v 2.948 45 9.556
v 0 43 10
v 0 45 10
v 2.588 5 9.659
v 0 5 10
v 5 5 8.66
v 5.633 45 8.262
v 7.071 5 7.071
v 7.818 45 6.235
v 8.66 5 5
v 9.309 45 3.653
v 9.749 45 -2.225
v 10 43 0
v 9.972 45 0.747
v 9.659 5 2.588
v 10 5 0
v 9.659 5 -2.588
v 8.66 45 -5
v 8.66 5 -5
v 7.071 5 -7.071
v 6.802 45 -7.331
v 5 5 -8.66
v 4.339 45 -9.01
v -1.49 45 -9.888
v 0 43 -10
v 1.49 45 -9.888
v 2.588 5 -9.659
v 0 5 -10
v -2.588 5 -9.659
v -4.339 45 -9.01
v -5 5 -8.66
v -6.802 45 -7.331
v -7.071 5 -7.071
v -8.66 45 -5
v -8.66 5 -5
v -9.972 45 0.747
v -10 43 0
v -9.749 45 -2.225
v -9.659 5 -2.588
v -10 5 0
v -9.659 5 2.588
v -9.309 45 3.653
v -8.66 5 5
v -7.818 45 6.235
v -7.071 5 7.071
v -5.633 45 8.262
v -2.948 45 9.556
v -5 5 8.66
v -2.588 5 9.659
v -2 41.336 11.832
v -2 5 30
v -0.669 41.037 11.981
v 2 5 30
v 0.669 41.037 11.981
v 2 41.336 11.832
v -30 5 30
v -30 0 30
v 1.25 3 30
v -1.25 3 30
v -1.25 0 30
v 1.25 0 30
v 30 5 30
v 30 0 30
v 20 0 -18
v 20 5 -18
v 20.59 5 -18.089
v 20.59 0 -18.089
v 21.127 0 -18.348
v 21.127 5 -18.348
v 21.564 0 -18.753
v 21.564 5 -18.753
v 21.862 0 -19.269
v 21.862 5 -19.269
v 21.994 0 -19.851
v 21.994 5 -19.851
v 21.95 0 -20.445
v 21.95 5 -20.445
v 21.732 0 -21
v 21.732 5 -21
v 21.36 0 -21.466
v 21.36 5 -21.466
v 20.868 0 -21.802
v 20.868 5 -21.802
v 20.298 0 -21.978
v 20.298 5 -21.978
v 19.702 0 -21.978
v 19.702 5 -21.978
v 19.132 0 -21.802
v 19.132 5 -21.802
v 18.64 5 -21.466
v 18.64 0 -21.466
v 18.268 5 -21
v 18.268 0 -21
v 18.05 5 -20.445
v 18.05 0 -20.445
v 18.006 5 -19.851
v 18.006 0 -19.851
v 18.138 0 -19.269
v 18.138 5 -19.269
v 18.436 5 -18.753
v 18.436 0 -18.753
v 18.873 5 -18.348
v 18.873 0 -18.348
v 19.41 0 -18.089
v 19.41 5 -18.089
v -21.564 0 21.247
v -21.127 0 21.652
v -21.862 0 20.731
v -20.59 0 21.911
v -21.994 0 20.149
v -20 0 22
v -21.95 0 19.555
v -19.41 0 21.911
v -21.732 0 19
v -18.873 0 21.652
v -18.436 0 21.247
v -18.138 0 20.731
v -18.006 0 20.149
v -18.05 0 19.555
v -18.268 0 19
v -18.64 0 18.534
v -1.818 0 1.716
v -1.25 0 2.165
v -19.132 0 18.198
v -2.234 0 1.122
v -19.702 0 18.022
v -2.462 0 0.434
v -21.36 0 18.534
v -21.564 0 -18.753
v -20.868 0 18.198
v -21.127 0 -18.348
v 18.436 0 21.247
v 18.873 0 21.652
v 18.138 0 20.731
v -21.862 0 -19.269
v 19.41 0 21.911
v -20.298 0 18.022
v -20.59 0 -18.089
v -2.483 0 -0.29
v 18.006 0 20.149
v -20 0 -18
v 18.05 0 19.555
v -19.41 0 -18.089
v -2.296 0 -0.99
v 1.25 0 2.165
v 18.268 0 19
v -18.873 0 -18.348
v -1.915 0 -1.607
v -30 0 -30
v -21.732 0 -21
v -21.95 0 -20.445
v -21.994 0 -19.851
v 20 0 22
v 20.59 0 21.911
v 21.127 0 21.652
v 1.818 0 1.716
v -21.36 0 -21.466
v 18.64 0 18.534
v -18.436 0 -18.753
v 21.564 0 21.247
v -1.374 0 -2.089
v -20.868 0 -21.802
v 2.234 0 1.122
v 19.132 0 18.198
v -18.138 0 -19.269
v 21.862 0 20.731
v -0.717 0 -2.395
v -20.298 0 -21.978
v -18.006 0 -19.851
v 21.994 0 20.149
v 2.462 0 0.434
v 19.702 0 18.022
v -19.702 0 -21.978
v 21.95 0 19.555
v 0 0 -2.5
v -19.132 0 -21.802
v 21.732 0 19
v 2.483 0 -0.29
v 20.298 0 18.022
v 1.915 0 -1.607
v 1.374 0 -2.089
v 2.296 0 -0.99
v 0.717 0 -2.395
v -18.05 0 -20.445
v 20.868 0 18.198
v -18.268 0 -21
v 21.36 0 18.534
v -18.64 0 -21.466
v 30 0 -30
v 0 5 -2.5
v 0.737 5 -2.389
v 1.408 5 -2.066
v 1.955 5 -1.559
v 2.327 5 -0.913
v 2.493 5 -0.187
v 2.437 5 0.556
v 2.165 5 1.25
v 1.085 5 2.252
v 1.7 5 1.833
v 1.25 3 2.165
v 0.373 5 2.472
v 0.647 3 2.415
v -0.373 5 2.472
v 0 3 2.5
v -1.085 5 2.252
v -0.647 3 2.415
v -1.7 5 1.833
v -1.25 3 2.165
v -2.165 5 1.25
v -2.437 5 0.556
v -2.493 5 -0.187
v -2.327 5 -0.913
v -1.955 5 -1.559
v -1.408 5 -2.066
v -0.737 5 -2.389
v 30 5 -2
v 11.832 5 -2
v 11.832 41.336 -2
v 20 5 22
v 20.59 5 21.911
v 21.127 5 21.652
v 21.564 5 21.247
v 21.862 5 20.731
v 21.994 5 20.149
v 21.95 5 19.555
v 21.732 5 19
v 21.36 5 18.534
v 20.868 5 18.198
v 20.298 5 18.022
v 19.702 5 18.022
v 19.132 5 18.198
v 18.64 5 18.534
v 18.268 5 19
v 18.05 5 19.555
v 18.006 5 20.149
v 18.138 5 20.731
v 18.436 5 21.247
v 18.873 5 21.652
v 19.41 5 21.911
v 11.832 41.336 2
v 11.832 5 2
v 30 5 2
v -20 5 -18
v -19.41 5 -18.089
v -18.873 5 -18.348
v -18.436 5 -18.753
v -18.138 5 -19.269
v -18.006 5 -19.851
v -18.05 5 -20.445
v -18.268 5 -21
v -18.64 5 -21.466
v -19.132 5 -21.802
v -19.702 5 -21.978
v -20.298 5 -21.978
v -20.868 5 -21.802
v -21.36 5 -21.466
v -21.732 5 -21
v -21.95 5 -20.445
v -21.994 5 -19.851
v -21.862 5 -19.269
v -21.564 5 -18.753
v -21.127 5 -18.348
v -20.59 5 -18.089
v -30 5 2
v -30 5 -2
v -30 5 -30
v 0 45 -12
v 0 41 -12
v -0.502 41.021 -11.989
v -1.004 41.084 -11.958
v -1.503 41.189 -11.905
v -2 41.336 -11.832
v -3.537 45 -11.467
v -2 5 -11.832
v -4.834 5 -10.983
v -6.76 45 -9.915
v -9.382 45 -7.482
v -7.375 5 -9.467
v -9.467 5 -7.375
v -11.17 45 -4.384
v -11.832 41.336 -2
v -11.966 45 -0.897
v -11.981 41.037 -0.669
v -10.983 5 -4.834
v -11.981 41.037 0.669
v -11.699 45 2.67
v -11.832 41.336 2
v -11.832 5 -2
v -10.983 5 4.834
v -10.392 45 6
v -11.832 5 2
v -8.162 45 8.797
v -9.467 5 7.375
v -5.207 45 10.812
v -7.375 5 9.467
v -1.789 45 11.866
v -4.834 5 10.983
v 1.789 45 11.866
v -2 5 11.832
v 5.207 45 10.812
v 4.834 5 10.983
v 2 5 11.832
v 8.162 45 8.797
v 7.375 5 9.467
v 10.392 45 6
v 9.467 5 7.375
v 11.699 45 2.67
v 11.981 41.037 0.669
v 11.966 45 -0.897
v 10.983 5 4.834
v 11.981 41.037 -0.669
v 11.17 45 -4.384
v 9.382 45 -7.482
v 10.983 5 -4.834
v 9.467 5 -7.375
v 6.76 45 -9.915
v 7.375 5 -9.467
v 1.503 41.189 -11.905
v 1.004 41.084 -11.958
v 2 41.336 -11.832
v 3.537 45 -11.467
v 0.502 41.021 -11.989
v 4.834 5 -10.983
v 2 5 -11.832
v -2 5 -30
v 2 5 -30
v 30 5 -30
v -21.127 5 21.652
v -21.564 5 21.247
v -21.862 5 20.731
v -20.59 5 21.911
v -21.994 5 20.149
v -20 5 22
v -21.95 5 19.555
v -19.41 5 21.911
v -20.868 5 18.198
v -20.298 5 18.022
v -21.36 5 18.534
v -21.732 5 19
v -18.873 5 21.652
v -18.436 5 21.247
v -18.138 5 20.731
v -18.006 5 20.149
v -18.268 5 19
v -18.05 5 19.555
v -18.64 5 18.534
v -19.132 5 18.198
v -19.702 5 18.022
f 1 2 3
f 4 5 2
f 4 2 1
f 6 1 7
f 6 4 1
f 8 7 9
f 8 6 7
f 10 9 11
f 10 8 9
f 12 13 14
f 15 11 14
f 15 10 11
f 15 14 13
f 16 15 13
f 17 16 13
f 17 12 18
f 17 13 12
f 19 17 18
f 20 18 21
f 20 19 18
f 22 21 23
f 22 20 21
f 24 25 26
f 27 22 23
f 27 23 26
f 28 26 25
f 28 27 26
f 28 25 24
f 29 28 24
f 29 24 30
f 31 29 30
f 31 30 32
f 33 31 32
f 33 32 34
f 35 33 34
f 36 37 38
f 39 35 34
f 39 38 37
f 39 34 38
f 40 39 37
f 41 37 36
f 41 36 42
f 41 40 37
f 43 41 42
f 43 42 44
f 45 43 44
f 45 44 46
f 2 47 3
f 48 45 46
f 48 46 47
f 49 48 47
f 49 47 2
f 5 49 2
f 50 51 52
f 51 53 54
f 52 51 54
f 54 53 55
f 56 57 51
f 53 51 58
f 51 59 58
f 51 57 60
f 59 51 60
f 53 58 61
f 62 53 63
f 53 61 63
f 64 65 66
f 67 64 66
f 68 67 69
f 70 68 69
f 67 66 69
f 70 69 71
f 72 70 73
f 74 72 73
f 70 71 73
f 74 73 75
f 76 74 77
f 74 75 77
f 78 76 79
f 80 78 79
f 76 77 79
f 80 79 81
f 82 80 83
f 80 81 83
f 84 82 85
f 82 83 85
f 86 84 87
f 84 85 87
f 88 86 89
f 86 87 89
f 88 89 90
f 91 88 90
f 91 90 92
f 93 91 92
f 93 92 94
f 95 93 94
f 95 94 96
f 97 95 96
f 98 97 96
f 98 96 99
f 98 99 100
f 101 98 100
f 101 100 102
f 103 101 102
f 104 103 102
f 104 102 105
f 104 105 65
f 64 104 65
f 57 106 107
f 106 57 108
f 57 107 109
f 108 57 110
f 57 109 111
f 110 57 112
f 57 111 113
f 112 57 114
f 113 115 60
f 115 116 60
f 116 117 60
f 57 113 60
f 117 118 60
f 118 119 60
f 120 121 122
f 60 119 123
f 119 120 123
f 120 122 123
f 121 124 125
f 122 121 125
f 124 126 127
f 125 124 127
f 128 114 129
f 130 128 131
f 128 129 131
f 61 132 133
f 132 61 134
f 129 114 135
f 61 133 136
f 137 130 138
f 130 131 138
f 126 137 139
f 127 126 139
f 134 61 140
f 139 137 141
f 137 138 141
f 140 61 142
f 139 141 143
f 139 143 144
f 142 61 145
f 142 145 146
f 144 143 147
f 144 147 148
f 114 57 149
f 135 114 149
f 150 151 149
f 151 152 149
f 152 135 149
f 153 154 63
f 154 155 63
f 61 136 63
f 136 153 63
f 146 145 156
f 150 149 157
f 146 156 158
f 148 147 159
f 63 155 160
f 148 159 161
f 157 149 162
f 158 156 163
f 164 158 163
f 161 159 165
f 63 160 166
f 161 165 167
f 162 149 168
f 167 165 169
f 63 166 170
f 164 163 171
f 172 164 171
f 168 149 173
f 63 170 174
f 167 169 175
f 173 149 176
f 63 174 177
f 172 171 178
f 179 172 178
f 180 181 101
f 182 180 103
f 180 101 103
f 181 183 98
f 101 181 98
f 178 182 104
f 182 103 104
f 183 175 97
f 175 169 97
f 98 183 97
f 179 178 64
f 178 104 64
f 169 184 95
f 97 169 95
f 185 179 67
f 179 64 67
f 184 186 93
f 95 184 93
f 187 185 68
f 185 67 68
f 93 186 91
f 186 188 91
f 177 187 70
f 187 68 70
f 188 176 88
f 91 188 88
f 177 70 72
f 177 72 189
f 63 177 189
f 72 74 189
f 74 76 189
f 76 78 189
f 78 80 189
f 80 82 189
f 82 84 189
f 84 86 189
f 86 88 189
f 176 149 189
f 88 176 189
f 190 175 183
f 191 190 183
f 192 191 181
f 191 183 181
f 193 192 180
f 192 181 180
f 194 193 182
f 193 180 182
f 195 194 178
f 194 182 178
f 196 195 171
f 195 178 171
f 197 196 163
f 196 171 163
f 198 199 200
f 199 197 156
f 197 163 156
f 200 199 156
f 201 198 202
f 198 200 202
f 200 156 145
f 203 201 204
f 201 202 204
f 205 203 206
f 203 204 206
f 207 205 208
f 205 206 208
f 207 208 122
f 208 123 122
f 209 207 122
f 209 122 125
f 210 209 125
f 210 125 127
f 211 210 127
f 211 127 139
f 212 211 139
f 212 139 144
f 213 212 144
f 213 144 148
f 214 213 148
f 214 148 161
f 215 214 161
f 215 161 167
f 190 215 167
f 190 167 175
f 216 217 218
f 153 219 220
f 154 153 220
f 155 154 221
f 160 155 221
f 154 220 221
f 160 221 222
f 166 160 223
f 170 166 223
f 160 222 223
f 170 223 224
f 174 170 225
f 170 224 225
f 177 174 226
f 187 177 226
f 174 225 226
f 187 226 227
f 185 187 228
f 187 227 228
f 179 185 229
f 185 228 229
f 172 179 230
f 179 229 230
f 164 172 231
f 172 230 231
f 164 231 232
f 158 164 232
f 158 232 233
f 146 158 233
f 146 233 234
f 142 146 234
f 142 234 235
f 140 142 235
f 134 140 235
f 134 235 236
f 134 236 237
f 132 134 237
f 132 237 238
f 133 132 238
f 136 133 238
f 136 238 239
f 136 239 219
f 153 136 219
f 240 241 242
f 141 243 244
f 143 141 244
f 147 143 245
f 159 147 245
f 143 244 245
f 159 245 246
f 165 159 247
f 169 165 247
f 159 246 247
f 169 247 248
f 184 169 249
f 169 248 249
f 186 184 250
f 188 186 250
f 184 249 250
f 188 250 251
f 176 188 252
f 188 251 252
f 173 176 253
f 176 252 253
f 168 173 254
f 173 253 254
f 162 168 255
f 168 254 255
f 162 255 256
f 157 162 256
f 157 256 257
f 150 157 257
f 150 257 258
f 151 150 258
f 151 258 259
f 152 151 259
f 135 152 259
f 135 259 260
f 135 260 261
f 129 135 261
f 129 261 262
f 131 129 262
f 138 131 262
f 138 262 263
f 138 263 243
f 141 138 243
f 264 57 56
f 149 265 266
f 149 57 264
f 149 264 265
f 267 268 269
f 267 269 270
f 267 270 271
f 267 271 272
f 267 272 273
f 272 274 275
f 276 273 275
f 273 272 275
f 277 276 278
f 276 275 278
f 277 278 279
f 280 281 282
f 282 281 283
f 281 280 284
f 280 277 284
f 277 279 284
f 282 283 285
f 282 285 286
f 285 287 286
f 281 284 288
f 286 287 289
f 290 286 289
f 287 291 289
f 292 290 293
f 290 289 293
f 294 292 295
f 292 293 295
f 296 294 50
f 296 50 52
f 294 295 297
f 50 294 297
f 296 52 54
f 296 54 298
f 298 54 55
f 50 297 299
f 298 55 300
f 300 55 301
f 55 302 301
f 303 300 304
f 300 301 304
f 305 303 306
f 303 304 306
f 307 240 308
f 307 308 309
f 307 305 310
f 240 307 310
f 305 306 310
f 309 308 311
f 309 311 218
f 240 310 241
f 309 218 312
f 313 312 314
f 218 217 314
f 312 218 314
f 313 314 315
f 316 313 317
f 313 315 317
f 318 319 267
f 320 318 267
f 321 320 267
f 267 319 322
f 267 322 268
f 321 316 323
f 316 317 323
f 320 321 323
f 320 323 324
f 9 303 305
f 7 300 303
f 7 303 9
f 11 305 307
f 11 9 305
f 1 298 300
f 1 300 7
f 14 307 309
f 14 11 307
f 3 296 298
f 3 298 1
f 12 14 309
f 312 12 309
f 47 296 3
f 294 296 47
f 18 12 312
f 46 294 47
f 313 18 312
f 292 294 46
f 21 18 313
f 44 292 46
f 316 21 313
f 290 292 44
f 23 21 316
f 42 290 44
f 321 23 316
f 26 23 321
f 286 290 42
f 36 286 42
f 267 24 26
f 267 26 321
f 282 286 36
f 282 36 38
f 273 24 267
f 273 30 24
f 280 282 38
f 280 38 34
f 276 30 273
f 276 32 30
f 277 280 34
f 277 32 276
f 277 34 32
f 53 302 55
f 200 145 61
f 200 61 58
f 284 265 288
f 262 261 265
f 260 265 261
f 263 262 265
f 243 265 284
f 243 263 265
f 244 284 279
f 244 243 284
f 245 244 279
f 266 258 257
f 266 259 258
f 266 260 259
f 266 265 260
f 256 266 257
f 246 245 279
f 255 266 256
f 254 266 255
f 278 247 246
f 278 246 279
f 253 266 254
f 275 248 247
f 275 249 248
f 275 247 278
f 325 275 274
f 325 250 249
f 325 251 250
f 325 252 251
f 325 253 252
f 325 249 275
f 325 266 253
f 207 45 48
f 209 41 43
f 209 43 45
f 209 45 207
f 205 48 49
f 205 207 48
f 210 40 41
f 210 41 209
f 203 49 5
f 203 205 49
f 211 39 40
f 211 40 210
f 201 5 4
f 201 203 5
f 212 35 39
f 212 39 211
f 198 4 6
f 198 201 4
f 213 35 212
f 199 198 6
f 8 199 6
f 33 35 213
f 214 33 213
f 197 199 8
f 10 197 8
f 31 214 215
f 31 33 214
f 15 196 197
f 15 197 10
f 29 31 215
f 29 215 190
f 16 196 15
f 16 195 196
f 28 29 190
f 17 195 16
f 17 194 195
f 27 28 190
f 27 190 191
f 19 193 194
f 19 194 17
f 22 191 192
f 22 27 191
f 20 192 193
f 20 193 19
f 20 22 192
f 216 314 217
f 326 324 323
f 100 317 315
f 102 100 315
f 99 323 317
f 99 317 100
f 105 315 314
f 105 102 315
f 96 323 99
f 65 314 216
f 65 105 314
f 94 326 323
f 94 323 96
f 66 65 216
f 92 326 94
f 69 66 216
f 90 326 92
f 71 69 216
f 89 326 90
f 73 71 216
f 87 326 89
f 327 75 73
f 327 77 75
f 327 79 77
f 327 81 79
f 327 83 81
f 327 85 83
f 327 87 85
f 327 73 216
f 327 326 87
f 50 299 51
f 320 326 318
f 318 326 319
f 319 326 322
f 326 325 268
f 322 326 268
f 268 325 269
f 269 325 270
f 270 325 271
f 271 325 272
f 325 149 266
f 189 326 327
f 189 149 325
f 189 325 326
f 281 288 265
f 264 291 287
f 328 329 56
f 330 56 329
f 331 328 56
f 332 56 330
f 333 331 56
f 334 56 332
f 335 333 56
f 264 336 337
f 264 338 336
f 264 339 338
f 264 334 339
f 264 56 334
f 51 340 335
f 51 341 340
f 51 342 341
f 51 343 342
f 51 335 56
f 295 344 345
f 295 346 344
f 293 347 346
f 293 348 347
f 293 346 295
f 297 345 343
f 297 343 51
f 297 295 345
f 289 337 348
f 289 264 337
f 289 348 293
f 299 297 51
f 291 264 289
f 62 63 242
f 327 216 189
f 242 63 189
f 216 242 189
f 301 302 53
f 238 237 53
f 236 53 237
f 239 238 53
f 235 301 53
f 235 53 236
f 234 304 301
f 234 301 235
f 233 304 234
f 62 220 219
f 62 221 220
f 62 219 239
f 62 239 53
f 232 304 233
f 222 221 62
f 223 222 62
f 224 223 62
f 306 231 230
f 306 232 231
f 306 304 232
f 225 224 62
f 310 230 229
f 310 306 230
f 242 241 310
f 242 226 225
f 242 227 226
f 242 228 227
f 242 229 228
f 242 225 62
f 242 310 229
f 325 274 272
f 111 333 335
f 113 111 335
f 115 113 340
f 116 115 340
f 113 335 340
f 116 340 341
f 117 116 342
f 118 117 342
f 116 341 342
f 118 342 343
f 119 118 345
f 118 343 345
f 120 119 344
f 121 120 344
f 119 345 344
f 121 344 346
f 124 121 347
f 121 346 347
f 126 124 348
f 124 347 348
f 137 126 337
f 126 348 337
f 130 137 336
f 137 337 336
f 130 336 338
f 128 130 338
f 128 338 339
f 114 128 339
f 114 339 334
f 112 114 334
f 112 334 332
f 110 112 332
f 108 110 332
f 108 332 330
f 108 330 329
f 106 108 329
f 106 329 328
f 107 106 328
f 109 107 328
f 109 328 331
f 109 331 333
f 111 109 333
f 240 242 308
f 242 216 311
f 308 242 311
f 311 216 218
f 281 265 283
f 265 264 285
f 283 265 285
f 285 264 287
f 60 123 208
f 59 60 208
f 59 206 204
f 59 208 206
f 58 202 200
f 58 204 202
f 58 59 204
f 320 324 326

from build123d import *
from build123d.topology import SkipClean

# Parameters (mm, degrees)
BASISVLAK_W          = 60
BASISVLAK_H          = 60
BASIS_DEPTH          = 5
CIRKELS_HOUDER_R     = 12
CIRKELS_HOUDER_R_2   = 10
HOUDER_DEPTH         = 40
CIRKEL_GAT_R         = 2
GATEN_DEPTH          = 59.309518948
GAT_KABELS_REACH     = 63.847
CIRKEL_GAT_KABELS_R  = 2.5
RIBBE_START          = -2
RIBBE_DEPTH          = 4
RIBBEN_PATROON_COUNT = 4
GLEUF_REACH          = 82.777
GLEUF_END_RADIUS     = 2.5
VIERKANT_BASIS_W     = 2.5
VIERKANT_BASIS_H     = 3


# Read off the part's stored shape, not the designer's step: Ribbe
with BuildPart() as part:
    # Basisvlak → Basis (new body)
    with BuildSketch(Plane(origin=(0, 0, 0), x_dir=(1, 0, 0), z_dir=(0, 1, 0))):
        Rectangle(BASISVLAK_W, BASISVLAK_H)
    extrude(amount=BASIS_DEPTH)

    # Cirkels houder → Houder (add)
    with BuildSketch(Plane(origin=(0, 5, 0), x_dir=(1, 0, 0), z_dir=(0, 1, 0))):
        with Locations(Location((0, 0, 0), (0, 0, 90))):
            Circle(CIRKELS_HOUDER_R)
        with Locations(Location((0, 0, 0), (0, 0, 270))):
            Circle(CIRKELS_HOUDER_R_2, mode=Mode.SUBTRACT)
    extrude(amount=HOUDER_DEPTH)

    # Cirkel gat → Gaten (cut, through all)
    with BuildSketch(Plane(origin=(0, 5, 0), x_dir=(1, 0, 0), z_dir=(0, 1, 0))):
        with Locations(Location((-20, -20, 0), (0, 0, 270))):
            Circle(CIRKEL_GAT_R)
        with Locations(Location((20, -20, 0), (0, 0, 270))):
            Circle(CIRKEL_GAT_R)
        with Locations(Location((-20, 20, 0), (0, 0, 270))):
            Circle(CIRKEL_GAT_R)
        with Locations(Location((20, 20, 0), (0, 0, 270))):
            Circle(CIRKEL_GAT_R)
    extrude(amount=-GATEN_DEPTH, mode=Mode.SUBTRACT)

    # Cirkel gat kabels → Gat kabels (cut, up to next)
    with BuildSketch(Plane(origin=(0, 0, 0), x_dir=(-1, 0, 0), z_dir=(0, -1, 0)), mode=Mode.PRIVATE) as gat_kabels_sk1:
        with Locations(Location((0, 0, 0), (0, 0, 90))):
            Circle(CIRKEL_GAT_KABELS_R)
    gat_kabels_tool1 = extrude(gat_kabels_sk1.sketch, amount=-GAT_KABELS_REACH, mode=Mode.PRIVATE) & part.part
    add(gat_kabels_tool1.solids().sort_by_distance((0, 0, 0))[0], mode=Mode.SUBTRACT)

    # Ribbe outline → Ribbe (add)
    with BuildSketch(Plane(origin=(0, 0, 0), x_dir=(0, 0, -1), z_dir=(1, 0, 0)).offset(RIBBE_START)):
        Polygon((30, 5), (11, 43), (10, 43), (10, 5), align=None)
    ribbe = extrude(amount=RIBBE_DEPTH)

    # Ribben patroon: Ribbe ×4 about axis
    with SkipClean():  # the faces are left unmerged after this step: merging them gives an invalid solid
        ribben_patroon_axis = Axis((0, 0, 0), (0, 1, 0))
        for i in range(1, RIBBEN_PATROON_COUNT):
            add(ribbe.rotate(ribben_patroon_axis, i * 360 / RIBBEN_PATROON_COUNT))

    # Gleuf: up to this cylinder (the profile starts outside it)
    with SkipClean():  # the faces are left unmerged after this step: merging them gives an invalid solid
        gleuf_end = Plane(origin=(0, 1.5, 0), z_dir=(0, -1, 0)) * Cylinder(GLEUF_END_RADIUS, 171.554, mode=Mode.PRIVATE)
        # vierkant_basis → Gleuf (cut, up to the surface)
        with BuildSketch(Plane.XY.offset(30), mode=Mode.PRIVATE) as gleuf_sk1:
            with Locations((0, 1.5)):
                Rectangle(VIERKANT_BASIS_W, VIERKANT_BASIS_H)
        gleuf_tool1 = extrude(gleuf_sk1.sketch, amount=-GLEUF_REACH, mode=Mode.PRIVATE) - gleuf_end
        add(gleuf_tool1.solids().sort_by_distance((0, 1.5, 30))[0], mode=Mode.SUBTRACT)


solid = part.part
